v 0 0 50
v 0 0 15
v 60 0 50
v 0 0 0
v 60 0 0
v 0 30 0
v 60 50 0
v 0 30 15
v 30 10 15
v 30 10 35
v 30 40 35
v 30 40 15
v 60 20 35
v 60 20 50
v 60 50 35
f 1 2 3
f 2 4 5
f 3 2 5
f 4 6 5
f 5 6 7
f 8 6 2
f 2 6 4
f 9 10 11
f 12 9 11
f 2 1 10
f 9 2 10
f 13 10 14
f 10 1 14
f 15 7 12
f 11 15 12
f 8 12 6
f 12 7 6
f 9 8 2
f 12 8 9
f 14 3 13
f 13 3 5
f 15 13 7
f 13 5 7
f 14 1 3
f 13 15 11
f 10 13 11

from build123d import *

# Parameters (mm, degrees)
BOSS_EXTRUDE1_DEPTH = 50
CUT_EXTRUDE1_DEPTH  = 35
CUT_EXTRUDE2_DEPTH  = 15


with BuildPart() as part:
    # Sketch1 → Boss-Extrude1 (new body)
    with BuildSketch(Plane.XY):
        Polygon((0, 30), (0, 0), (30, 10), (30, 40), align=None)
        Polygon((30, 40), (30, 10), (60, 20), (60, 50), align=None)
        Polygon((30, 10), (0, 0), (60, 0), (60, 20), align=None)
    extrude(amount=BOSS_EXTRUDE1_DEPTH)

    # Sketch2 → Cut-Extrude1 (cut)
    with BuildSketch(Plane.XY.offset(50)):
        Polygon((30, 10), (30, 40), (0, 30), (0, 0), align=None)
    extrude(amount=-CUT_EXTRUDE1_DEPTH, mode=Mode.SUBTRACT)

    # Sketch3 → Cut-Extrude2 (cut)
    with BuildSketch(Plane.XY.offset(50)):
        Polygon((30, 40), (60, 50), (60, 20), (30, 10), align=None)
    extrude(amount=-CUT_EXTRUDE2_DEPTH, mode=Mode.SUBTRACT)


solid = part.part
